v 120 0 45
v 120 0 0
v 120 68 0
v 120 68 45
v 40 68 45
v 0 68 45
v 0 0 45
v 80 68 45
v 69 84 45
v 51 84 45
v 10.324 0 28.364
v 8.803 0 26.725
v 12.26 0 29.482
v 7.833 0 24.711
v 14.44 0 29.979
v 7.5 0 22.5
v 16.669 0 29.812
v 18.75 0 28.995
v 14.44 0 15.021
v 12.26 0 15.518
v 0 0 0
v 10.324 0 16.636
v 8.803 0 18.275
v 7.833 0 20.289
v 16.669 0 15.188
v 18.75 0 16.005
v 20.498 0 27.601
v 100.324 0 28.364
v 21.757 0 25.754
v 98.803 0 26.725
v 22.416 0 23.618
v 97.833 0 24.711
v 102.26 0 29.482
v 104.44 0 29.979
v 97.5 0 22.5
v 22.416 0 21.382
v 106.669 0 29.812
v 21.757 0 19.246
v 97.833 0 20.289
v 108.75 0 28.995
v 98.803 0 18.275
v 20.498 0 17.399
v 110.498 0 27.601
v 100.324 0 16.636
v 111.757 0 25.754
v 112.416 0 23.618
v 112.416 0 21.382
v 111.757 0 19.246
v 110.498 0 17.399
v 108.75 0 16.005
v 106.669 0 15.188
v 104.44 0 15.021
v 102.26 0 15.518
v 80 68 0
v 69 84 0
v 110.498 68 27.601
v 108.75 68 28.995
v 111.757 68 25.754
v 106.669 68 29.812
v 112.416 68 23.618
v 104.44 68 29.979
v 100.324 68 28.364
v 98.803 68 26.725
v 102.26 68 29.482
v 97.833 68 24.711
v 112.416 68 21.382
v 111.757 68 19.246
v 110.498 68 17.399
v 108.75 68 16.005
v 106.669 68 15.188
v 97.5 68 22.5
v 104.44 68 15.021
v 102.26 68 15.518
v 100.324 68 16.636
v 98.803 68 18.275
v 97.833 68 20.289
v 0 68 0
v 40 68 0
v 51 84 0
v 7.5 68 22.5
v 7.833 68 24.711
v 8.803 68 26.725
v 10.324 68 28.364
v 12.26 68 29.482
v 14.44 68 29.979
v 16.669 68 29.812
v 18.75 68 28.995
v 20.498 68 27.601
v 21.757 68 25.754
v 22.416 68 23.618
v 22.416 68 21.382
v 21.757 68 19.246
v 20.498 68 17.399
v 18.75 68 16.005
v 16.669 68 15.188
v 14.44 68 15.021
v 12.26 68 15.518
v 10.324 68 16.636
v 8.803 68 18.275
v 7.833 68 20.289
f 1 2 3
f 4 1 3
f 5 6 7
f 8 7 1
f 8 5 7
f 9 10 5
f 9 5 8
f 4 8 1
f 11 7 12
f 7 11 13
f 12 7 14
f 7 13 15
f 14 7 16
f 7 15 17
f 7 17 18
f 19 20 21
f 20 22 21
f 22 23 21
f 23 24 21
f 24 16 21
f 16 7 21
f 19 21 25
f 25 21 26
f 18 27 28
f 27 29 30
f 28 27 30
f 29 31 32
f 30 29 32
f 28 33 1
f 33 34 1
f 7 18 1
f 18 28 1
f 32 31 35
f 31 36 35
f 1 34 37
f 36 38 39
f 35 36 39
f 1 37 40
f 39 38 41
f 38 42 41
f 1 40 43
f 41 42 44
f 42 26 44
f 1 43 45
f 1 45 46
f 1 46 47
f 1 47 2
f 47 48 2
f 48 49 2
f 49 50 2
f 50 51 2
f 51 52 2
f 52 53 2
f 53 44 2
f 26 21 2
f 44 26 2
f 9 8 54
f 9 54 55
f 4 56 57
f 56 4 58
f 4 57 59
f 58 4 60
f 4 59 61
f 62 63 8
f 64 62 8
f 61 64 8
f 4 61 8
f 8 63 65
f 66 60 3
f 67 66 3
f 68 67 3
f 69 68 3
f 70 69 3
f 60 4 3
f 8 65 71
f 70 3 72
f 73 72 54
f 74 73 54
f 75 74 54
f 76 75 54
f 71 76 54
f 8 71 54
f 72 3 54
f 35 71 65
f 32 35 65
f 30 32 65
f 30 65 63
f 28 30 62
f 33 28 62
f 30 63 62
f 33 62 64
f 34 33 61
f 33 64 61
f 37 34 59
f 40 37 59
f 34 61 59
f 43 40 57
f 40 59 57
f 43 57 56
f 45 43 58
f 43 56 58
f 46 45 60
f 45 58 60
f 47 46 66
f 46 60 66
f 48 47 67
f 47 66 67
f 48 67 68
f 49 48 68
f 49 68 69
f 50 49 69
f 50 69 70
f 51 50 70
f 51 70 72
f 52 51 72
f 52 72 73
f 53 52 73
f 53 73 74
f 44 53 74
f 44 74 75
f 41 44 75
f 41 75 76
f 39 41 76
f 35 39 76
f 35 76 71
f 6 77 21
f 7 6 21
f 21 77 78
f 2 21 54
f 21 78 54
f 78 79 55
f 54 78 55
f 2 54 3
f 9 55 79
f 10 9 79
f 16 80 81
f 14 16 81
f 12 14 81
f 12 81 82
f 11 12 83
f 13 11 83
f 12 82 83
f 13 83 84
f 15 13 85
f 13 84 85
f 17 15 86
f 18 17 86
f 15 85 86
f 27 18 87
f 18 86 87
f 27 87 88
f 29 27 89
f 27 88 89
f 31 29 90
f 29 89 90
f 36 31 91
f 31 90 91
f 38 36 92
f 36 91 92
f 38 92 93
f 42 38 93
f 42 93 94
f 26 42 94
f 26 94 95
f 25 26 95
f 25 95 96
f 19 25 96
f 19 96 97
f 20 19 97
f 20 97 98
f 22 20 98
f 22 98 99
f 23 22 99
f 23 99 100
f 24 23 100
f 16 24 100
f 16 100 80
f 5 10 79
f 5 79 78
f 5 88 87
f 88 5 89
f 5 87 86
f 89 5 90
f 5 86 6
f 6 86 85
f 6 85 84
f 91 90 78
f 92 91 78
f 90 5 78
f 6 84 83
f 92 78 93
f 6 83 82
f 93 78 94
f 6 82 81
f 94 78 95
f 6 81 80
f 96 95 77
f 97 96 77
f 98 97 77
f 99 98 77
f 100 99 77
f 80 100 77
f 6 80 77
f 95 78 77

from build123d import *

# Parameters (mm, degrees)
BOSS_EXTRU_1_DEPTH      = 45
ESQUISSE2_R             = 7.5
BOSS_EXTRU_2_DEPTH      = 68
ESQUISSE2_4_R           = 7.5
ENL_V_MAT_EXTRU_1_DEPTH = 69


with BuildPart() as part:
    # Esquisse1 → Boss.-Extru.1 (new body)
    with BuildSketch(Plane.XY):
        Polygon((0, 0), (120, 0), (120, 68), (80, 68), (69, 84), (51, 84), (40, 68), (0, 68), align=None)
    extrude(amount=BOSS_EXTRU_1_DEPTH)

    # Esquisse2 → Boss.-Extru.2 (add, through all)
    with BuildSketch(Plane(origin=(0, 68, 0), x_dir=(1, 0, 0), z_dir=(0, 1, 0))):
        with Locations((105, -22.5)):
            Circle(ESQUISSE2_R)
        with Locations((15, -22.5)):
            Circle(ESQUISSE2_R)
    extrude(amount=-BOSS_EXTRU_2_DEPTH)

    # Esquisse2_4 → Enl_v. mat.-Extru.1 (cut, through all)
    with BuildSketch(Plane(origin=(0, 68, 0), x_dir=(1, 0, 0), z_dir=(0, 1, 0))):
        with Locations(Location((105, -22.5, 0), (0, 0, 180))):  # turned: the seam where the file's is
            Circle(ESQUISSE2_4_R)
        with Locations(Location((15, -22.5, 0), (0, 0, 180))):  # turned: the seam where the file's is
            Circle(ESQUISSE2_4_R)
    extrude(amount=-ENL_V_MAT_EXTRU_1_DEPTH, mode=Mode.SUBTRACT)


solid = part.part
